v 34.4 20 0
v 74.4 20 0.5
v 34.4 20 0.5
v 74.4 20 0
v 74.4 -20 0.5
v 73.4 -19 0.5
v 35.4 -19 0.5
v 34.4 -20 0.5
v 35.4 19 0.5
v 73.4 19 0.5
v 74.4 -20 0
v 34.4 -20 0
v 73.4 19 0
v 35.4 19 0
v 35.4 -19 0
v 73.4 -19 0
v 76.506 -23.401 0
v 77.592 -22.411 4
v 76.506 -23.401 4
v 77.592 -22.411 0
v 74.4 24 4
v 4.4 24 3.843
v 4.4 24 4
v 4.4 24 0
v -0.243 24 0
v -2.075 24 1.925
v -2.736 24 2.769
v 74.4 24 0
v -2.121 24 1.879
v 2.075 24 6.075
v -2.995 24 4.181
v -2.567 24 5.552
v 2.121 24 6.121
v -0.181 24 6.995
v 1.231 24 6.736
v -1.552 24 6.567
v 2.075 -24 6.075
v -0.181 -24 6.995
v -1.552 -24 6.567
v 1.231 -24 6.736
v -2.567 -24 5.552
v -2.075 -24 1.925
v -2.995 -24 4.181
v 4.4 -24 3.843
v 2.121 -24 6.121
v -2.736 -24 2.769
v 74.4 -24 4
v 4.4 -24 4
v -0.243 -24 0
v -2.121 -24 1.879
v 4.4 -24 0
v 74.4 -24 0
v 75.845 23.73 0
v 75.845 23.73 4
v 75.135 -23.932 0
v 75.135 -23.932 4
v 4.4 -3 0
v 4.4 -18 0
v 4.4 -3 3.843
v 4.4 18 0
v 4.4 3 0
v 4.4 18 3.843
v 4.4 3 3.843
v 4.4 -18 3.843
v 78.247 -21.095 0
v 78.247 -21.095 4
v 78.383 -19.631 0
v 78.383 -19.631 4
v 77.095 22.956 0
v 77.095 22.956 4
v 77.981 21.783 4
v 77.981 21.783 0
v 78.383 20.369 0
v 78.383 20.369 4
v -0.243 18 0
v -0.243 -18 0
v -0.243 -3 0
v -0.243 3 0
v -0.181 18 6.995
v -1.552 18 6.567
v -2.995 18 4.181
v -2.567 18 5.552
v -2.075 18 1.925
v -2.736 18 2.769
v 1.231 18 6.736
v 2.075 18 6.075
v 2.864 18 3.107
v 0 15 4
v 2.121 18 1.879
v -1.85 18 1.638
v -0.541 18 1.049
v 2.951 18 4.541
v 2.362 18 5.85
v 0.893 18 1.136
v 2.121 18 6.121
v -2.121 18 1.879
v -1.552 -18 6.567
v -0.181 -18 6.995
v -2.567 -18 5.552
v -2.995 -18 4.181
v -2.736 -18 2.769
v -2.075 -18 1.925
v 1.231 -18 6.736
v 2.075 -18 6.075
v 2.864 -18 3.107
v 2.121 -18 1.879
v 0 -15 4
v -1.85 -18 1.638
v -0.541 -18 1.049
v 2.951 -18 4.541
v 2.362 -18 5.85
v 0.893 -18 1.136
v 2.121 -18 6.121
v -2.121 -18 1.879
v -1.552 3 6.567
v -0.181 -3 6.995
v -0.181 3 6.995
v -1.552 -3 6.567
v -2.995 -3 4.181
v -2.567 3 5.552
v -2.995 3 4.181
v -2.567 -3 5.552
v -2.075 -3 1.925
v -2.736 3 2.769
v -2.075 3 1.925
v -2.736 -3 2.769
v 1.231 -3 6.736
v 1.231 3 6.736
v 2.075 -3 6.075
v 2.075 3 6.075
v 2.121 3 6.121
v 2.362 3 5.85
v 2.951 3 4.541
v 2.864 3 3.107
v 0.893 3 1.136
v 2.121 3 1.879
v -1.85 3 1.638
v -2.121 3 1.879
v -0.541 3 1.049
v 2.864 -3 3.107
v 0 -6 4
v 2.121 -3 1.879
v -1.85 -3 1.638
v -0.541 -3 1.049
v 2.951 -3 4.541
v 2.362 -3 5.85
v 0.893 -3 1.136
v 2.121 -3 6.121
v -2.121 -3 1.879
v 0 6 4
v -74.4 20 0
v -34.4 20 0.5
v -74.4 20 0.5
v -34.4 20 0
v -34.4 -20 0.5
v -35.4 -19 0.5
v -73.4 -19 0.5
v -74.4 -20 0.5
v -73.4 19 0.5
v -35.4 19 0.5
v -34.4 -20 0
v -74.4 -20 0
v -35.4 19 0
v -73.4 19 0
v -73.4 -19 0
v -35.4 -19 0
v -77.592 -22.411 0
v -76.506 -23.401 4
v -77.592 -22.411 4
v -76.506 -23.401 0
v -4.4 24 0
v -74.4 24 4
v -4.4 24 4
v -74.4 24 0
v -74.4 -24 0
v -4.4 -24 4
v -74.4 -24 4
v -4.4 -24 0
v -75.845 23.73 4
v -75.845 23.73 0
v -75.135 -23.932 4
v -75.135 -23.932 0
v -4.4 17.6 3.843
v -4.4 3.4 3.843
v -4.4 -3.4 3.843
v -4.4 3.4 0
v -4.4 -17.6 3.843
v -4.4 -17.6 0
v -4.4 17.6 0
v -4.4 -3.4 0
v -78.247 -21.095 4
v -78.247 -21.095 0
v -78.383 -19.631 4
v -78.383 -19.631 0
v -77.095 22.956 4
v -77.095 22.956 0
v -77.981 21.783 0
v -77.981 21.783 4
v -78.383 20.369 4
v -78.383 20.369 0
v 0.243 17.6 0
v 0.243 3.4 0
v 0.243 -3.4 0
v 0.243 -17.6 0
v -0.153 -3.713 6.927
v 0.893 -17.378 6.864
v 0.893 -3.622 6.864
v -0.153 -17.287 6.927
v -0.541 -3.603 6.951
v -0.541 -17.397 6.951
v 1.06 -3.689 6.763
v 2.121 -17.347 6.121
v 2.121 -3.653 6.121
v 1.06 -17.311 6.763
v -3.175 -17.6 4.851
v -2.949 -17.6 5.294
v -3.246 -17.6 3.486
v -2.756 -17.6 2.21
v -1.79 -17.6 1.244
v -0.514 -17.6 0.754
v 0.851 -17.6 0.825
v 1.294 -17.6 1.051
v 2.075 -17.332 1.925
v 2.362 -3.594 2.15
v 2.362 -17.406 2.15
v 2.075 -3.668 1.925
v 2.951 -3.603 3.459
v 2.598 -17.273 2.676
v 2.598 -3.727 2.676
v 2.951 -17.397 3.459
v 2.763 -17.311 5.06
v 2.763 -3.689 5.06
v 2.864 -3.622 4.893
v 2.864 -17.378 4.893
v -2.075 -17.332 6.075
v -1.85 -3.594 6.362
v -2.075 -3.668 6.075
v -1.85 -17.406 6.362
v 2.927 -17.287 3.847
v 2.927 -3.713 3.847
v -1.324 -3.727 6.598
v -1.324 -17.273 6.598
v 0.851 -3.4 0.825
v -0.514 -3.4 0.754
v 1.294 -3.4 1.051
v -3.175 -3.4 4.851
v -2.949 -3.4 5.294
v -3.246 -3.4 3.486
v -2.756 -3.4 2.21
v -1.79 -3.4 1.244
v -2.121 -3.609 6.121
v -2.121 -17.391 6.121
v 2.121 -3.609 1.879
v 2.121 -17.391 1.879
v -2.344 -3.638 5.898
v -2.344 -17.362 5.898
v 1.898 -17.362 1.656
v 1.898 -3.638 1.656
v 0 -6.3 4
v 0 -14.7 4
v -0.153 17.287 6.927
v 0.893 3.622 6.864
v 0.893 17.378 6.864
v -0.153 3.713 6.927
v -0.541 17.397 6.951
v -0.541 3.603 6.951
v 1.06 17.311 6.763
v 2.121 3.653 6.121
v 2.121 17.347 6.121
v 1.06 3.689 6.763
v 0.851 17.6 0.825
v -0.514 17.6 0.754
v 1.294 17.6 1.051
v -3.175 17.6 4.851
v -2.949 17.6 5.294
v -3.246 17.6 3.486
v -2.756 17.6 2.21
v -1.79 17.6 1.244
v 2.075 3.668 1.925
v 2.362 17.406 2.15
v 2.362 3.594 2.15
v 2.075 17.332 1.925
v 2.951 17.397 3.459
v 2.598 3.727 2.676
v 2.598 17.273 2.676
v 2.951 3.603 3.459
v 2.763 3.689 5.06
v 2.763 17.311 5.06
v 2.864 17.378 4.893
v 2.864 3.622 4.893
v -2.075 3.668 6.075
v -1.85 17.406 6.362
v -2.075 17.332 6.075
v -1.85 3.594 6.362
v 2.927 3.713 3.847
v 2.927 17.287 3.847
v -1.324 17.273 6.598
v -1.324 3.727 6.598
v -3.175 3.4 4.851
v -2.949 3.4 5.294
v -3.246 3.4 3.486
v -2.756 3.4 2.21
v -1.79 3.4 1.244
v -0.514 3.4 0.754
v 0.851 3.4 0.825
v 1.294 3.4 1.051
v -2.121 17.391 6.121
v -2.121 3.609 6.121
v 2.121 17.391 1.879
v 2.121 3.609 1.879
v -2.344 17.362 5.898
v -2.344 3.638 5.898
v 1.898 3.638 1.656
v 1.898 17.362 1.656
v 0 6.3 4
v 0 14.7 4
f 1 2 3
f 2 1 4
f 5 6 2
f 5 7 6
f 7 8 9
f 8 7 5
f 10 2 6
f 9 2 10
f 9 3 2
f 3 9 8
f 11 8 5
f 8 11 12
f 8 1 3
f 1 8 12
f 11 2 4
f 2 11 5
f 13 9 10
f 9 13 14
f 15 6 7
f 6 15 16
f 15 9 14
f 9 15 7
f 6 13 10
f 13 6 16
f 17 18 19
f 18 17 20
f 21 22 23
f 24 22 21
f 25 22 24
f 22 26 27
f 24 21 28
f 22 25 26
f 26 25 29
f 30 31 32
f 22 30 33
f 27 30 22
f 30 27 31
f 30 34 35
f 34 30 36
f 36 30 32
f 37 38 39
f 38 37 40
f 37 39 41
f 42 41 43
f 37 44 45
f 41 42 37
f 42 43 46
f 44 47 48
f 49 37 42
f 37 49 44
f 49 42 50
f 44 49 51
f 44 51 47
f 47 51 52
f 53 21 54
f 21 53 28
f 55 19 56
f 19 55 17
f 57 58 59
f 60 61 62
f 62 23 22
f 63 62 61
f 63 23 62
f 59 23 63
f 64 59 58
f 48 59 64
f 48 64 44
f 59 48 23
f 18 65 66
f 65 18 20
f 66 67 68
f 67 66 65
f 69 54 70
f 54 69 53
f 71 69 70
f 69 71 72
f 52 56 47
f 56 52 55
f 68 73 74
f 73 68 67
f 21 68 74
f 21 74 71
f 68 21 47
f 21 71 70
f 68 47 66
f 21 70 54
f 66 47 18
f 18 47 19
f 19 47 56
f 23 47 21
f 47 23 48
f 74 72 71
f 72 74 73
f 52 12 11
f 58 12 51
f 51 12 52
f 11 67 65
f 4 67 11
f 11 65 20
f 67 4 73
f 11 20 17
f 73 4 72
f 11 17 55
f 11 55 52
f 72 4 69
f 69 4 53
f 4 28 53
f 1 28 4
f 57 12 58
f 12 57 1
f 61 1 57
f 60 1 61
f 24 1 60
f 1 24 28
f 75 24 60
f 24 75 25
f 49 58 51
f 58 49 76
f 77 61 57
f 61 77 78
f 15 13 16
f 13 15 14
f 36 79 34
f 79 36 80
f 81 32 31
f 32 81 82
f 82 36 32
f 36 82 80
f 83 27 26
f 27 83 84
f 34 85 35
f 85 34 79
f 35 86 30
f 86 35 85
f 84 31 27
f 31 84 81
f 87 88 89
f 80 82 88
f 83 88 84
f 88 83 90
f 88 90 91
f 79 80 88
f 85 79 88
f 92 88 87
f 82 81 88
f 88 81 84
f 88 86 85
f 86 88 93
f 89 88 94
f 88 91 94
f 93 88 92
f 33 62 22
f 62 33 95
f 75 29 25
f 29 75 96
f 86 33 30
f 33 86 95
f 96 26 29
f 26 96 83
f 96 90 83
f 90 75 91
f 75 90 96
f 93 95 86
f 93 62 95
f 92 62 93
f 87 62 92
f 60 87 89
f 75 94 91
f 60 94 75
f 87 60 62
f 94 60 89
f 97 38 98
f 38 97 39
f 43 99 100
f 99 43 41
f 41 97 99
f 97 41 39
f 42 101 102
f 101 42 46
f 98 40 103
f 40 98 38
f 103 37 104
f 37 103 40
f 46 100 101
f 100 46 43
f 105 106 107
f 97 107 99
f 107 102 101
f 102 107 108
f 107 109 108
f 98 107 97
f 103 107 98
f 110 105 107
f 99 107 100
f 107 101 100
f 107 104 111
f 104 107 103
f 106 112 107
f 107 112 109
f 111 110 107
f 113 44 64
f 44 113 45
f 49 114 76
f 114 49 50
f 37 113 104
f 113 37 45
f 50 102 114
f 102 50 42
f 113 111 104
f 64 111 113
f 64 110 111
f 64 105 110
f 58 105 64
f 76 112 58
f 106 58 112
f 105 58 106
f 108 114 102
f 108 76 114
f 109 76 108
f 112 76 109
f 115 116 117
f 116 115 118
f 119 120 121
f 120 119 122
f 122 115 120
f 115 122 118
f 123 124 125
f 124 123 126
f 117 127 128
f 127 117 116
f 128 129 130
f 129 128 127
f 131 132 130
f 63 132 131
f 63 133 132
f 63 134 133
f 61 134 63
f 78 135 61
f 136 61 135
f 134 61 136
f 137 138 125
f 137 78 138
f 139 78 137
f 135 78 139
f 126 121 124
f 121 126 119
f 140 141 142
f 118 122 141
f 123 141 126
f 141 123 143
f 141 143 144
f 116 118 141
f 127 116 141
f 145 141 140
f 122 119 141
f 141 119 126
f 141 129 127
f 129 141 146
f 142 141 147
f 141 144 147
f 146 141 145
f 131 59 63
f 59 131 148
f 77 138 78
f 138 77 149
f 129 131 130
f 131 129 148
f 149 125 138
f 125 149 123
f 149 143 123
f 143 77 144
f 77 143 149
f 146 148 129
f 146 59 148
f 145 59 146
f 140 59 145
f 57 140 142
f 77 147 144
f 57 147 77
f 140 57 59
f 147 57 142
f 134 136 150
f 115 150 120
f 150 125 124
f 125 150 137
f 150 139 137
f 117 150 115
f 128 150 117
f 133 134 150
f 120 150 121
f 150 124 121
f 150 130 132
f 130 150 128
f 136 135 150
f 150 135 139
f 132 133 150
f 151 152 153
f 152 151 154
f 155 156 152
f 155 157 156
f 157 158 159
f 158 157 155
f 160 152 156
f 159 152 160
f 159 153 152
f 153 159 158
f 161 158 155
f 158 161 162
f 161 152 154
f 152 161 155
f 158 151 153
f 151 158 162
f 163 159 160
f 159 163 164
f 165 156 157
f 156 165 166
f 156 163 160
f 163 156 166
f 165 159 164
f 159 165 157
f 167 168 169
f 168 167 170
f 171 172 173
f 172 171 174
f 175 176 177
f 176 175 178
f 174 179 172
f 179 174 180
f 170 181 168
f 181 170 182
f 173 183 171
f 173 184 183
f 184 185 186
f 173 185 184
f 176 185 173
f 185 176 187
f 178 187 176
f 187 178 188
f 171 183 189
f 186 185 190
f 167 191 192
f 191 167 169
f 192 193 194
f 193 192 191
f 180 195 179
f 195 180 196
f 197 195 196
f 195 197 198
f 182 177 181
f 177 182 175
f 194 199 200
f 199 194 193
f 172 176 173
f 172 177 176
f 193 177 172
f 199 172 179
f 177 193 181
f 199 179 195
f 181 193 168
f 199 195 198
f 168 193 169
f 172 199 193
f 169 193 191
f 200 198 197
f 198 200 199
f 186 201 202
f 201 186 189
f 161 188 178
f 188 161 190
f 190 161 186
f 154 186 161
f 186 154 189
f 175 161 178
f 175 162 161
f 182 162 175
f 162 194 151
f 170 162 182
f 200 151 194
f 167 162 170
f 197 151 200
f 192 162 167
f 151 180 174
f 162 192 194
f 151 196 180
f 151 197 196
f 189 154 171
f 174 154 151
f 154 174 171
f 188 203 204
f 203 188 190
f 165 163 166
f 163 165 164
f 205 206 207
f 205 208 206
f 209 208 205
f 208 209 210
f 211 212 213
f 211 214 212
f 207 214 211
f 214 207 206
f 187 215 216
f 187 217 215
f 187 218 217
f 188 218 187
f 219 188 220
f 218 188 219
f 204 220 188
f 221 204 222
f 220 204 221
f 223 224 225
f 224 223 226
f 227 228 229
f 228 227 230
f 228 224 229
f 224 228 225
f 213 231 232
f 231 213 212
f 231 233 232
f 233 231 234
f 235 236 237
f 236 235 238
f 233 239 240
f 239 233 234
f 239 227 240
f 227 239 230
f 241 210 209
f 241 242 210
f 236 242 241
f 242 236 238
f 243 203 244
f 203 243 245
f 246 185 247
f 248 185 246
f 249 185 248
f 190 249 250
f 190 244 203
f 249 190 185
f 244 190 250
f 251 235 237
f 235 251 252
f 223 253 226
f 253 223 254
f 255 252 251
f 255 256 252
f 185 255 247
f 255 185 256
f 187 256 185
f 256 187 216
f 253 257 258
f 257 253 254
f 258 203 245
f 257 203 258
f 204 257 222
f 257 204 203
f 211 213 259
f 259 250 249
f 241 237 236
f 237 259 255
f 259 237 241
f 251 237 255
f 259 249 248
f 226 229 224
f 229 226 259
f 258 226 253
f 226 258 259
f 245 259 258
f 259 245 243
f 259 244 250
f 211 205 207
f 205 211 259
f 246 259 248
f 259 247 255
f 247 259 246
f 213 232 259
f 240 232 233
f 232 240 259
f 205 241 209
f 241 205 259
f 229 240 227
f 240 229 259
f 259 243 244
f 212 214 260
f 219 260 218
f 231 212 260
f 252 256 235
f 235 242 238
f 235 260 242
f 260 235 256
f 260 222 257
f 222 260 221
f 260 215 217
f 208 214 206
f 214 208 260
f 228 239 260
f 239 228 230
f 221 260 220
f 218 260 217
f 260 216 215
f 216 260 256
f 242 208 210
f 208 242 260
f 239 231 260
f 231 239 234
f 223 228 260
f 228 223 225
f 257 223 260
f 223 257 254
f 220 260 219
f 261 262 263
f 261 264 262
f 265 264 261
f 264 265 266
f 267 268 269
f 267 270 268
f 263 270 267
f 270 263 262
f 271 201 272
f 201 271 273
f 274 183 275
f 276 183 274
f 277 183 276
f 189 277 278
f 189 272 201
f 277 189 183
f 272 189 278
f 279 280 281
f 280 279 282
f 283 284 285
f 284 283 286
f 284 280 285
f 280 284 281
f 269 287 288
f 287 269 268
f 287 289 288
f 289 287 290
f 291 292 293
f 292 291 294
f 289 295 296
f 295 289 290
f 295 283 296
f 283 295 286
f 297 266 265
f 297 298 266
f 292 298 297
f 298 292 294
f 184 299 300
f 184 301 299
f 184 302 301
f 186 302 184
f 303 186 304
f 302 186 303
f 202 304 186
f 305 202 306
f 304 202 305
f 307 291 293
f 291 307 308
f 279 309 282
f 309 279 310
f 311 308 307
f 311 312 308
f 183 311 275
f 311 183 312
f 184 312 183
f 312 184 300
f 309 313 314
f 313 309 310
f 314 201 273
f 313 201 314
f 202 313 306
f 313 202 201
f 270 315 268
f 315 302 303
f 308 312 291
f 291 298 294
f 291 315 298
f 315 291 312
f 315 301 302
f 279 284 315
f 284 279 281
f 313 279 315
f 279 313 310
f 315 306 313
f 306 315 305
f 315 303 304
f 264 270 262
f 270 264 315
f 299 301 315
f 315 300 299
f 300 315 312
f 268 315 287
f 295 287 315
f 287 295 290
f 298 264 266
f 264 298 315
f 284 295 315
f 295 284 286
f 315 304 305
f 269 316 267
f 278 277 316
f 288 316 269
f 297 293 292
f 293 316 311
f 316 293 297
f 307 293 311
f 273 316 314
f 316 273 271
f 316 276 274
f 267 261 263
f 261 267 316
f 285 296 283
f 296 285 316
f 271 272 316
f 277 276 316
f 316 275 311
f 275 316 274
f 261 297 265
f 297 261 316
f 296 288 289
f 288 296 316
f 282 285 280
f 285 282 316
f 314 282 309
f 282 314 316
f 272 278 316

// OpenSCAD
// preview[view:south, tilt:top]

/* [Global] */

// Load a 100x100 pixel image.(images will be stretched to fit) Simple, high contrast images work best. Make sure to click the Invert Colors checkbox!
image_file = "smile.dat"; // [image_surface:100x100]

// Where would you like the hinge in relation to your image?
hinge_placement = 1; // [1:top,2:left,3:bottom,4:right]

// What height would you like for the embossed area (mm)?
emboss_height = 1.5;

/* [Hidden] */
$fa = 6;
$fs = 1.5;
image_width = 40;
image_length = 40;
image_padding = 4;

handle_width = image_width + image_padding*2;
handle_length = 70;
handle_height = emboss_height+2.5;
nub = 3; // hinge size
tol = 0.4; // spacing between hinge pieces

assembly();

module assembly() {
    stamp_top(90*hinge_placement);
    stamp_bottom(90*hinge_placement);   
}

module stamp_top(rot=90) {
    translate([1,0,0])
    union() {
        difference () {
            translate([handle_length + nub + tol, -handle_width/2, 0])
                rotate([0,0,90]) handle();
            translate([handle_length-image_length/2+nub+tol,0,handle_height]) 
                rotate([0,180,rot]) plate();
        }
    
        // hinge
        translate([-1,handle_width/2-2*nub,handle_height]) hinge_m();
        mirror([0,1,0]) translate([-1,handle_width/2-2*nub,handle_height]) hinge_m();
        translate([-1,-nub,handle_height]) hinge_m();
        mirror([0,1,0]) translate([-1,-nub,handle_height]) hinge_m();
    }
}

module stamp_bottom(rot=90) {
    translate([-1,0,0])
    union() {
        translate([-handle_length + image_length/2-nub-tol,0,handle_height]) 
            rotate([0,0,-rot]) plate();
        mirror([1,0,0]) translate([handle_length + nub + tol, -handle_width/2, 0]) 
            rotate([0,0,90]) handle();
        
        // hinge
        translate([1,-nub-tol,handle_height]) hinge_f();
        mirror([0,1,0]) translate([1,-nub-tol,handle_height]) hinge_f();
    }
}

module handle() {
    difference() {
        hull() {
            cube([handle_width, handle_length, handle_height]);
            translate([image_padding,0,0]) cylinder(r=image_padding, h=handle_height);
            translate([handle_width-image_padding,0,0]) cylinder(r=image_padding, h=handle_height);
        }
        guide();
    }

}

module guide() {
    translate([image_padding,0,-.5]) 
    difference() {
        cube([image_width, image_length, 1]);
        translate([1,1,-0.5]) cube([image_width-2, image_length-2, 2]);
    }
}

module hinge_m() {
    difference () {
    	rotate([0,45,0]) union(){
            translate([0,0,-nub]) cube ([nub*3,nub*2, nub*2]);
            rotate([90,0,0]) {
                translate([0,0,-2*nub]) cylinder(r=nub,h=2*nub);
    		    cylinder(r1=nub,r2=0,h=nub);
            }
    	}
        translate([-nub,-nub/2,-handle_height-nub*5]) cube([nub*5, nub*3, nub*5]);
    }
}

module hinge_f() {
    len = handle_width/2 - 3*nub - 2*tol;
    
    difference() {
        rotate([90,-45,0]) 
        difference() {
            union() {
                cylinder(r=nub, h=len);
                translate([-3*nub,-nub,0]) cube([nub*3,nub*2,len]);
            }
            translate([0,0,-0.1]) cylinder(r1=nub+tol,r2=0,h=nub);
            translate([0,0,len-nub+0.1]) cylinder(r1=0,r2=nub+tol,h=nub);
        }
        translate([-nub*4,-len-nub/2,-handle_height-nub*5]) cube([nub*5, len+nub, nub*5]);
    }
}

module plate() {
    scale([(image_width)/100,(image_length)/100,emboss_height])
        surface(file=image_file, center=true, convexity=5);
}
